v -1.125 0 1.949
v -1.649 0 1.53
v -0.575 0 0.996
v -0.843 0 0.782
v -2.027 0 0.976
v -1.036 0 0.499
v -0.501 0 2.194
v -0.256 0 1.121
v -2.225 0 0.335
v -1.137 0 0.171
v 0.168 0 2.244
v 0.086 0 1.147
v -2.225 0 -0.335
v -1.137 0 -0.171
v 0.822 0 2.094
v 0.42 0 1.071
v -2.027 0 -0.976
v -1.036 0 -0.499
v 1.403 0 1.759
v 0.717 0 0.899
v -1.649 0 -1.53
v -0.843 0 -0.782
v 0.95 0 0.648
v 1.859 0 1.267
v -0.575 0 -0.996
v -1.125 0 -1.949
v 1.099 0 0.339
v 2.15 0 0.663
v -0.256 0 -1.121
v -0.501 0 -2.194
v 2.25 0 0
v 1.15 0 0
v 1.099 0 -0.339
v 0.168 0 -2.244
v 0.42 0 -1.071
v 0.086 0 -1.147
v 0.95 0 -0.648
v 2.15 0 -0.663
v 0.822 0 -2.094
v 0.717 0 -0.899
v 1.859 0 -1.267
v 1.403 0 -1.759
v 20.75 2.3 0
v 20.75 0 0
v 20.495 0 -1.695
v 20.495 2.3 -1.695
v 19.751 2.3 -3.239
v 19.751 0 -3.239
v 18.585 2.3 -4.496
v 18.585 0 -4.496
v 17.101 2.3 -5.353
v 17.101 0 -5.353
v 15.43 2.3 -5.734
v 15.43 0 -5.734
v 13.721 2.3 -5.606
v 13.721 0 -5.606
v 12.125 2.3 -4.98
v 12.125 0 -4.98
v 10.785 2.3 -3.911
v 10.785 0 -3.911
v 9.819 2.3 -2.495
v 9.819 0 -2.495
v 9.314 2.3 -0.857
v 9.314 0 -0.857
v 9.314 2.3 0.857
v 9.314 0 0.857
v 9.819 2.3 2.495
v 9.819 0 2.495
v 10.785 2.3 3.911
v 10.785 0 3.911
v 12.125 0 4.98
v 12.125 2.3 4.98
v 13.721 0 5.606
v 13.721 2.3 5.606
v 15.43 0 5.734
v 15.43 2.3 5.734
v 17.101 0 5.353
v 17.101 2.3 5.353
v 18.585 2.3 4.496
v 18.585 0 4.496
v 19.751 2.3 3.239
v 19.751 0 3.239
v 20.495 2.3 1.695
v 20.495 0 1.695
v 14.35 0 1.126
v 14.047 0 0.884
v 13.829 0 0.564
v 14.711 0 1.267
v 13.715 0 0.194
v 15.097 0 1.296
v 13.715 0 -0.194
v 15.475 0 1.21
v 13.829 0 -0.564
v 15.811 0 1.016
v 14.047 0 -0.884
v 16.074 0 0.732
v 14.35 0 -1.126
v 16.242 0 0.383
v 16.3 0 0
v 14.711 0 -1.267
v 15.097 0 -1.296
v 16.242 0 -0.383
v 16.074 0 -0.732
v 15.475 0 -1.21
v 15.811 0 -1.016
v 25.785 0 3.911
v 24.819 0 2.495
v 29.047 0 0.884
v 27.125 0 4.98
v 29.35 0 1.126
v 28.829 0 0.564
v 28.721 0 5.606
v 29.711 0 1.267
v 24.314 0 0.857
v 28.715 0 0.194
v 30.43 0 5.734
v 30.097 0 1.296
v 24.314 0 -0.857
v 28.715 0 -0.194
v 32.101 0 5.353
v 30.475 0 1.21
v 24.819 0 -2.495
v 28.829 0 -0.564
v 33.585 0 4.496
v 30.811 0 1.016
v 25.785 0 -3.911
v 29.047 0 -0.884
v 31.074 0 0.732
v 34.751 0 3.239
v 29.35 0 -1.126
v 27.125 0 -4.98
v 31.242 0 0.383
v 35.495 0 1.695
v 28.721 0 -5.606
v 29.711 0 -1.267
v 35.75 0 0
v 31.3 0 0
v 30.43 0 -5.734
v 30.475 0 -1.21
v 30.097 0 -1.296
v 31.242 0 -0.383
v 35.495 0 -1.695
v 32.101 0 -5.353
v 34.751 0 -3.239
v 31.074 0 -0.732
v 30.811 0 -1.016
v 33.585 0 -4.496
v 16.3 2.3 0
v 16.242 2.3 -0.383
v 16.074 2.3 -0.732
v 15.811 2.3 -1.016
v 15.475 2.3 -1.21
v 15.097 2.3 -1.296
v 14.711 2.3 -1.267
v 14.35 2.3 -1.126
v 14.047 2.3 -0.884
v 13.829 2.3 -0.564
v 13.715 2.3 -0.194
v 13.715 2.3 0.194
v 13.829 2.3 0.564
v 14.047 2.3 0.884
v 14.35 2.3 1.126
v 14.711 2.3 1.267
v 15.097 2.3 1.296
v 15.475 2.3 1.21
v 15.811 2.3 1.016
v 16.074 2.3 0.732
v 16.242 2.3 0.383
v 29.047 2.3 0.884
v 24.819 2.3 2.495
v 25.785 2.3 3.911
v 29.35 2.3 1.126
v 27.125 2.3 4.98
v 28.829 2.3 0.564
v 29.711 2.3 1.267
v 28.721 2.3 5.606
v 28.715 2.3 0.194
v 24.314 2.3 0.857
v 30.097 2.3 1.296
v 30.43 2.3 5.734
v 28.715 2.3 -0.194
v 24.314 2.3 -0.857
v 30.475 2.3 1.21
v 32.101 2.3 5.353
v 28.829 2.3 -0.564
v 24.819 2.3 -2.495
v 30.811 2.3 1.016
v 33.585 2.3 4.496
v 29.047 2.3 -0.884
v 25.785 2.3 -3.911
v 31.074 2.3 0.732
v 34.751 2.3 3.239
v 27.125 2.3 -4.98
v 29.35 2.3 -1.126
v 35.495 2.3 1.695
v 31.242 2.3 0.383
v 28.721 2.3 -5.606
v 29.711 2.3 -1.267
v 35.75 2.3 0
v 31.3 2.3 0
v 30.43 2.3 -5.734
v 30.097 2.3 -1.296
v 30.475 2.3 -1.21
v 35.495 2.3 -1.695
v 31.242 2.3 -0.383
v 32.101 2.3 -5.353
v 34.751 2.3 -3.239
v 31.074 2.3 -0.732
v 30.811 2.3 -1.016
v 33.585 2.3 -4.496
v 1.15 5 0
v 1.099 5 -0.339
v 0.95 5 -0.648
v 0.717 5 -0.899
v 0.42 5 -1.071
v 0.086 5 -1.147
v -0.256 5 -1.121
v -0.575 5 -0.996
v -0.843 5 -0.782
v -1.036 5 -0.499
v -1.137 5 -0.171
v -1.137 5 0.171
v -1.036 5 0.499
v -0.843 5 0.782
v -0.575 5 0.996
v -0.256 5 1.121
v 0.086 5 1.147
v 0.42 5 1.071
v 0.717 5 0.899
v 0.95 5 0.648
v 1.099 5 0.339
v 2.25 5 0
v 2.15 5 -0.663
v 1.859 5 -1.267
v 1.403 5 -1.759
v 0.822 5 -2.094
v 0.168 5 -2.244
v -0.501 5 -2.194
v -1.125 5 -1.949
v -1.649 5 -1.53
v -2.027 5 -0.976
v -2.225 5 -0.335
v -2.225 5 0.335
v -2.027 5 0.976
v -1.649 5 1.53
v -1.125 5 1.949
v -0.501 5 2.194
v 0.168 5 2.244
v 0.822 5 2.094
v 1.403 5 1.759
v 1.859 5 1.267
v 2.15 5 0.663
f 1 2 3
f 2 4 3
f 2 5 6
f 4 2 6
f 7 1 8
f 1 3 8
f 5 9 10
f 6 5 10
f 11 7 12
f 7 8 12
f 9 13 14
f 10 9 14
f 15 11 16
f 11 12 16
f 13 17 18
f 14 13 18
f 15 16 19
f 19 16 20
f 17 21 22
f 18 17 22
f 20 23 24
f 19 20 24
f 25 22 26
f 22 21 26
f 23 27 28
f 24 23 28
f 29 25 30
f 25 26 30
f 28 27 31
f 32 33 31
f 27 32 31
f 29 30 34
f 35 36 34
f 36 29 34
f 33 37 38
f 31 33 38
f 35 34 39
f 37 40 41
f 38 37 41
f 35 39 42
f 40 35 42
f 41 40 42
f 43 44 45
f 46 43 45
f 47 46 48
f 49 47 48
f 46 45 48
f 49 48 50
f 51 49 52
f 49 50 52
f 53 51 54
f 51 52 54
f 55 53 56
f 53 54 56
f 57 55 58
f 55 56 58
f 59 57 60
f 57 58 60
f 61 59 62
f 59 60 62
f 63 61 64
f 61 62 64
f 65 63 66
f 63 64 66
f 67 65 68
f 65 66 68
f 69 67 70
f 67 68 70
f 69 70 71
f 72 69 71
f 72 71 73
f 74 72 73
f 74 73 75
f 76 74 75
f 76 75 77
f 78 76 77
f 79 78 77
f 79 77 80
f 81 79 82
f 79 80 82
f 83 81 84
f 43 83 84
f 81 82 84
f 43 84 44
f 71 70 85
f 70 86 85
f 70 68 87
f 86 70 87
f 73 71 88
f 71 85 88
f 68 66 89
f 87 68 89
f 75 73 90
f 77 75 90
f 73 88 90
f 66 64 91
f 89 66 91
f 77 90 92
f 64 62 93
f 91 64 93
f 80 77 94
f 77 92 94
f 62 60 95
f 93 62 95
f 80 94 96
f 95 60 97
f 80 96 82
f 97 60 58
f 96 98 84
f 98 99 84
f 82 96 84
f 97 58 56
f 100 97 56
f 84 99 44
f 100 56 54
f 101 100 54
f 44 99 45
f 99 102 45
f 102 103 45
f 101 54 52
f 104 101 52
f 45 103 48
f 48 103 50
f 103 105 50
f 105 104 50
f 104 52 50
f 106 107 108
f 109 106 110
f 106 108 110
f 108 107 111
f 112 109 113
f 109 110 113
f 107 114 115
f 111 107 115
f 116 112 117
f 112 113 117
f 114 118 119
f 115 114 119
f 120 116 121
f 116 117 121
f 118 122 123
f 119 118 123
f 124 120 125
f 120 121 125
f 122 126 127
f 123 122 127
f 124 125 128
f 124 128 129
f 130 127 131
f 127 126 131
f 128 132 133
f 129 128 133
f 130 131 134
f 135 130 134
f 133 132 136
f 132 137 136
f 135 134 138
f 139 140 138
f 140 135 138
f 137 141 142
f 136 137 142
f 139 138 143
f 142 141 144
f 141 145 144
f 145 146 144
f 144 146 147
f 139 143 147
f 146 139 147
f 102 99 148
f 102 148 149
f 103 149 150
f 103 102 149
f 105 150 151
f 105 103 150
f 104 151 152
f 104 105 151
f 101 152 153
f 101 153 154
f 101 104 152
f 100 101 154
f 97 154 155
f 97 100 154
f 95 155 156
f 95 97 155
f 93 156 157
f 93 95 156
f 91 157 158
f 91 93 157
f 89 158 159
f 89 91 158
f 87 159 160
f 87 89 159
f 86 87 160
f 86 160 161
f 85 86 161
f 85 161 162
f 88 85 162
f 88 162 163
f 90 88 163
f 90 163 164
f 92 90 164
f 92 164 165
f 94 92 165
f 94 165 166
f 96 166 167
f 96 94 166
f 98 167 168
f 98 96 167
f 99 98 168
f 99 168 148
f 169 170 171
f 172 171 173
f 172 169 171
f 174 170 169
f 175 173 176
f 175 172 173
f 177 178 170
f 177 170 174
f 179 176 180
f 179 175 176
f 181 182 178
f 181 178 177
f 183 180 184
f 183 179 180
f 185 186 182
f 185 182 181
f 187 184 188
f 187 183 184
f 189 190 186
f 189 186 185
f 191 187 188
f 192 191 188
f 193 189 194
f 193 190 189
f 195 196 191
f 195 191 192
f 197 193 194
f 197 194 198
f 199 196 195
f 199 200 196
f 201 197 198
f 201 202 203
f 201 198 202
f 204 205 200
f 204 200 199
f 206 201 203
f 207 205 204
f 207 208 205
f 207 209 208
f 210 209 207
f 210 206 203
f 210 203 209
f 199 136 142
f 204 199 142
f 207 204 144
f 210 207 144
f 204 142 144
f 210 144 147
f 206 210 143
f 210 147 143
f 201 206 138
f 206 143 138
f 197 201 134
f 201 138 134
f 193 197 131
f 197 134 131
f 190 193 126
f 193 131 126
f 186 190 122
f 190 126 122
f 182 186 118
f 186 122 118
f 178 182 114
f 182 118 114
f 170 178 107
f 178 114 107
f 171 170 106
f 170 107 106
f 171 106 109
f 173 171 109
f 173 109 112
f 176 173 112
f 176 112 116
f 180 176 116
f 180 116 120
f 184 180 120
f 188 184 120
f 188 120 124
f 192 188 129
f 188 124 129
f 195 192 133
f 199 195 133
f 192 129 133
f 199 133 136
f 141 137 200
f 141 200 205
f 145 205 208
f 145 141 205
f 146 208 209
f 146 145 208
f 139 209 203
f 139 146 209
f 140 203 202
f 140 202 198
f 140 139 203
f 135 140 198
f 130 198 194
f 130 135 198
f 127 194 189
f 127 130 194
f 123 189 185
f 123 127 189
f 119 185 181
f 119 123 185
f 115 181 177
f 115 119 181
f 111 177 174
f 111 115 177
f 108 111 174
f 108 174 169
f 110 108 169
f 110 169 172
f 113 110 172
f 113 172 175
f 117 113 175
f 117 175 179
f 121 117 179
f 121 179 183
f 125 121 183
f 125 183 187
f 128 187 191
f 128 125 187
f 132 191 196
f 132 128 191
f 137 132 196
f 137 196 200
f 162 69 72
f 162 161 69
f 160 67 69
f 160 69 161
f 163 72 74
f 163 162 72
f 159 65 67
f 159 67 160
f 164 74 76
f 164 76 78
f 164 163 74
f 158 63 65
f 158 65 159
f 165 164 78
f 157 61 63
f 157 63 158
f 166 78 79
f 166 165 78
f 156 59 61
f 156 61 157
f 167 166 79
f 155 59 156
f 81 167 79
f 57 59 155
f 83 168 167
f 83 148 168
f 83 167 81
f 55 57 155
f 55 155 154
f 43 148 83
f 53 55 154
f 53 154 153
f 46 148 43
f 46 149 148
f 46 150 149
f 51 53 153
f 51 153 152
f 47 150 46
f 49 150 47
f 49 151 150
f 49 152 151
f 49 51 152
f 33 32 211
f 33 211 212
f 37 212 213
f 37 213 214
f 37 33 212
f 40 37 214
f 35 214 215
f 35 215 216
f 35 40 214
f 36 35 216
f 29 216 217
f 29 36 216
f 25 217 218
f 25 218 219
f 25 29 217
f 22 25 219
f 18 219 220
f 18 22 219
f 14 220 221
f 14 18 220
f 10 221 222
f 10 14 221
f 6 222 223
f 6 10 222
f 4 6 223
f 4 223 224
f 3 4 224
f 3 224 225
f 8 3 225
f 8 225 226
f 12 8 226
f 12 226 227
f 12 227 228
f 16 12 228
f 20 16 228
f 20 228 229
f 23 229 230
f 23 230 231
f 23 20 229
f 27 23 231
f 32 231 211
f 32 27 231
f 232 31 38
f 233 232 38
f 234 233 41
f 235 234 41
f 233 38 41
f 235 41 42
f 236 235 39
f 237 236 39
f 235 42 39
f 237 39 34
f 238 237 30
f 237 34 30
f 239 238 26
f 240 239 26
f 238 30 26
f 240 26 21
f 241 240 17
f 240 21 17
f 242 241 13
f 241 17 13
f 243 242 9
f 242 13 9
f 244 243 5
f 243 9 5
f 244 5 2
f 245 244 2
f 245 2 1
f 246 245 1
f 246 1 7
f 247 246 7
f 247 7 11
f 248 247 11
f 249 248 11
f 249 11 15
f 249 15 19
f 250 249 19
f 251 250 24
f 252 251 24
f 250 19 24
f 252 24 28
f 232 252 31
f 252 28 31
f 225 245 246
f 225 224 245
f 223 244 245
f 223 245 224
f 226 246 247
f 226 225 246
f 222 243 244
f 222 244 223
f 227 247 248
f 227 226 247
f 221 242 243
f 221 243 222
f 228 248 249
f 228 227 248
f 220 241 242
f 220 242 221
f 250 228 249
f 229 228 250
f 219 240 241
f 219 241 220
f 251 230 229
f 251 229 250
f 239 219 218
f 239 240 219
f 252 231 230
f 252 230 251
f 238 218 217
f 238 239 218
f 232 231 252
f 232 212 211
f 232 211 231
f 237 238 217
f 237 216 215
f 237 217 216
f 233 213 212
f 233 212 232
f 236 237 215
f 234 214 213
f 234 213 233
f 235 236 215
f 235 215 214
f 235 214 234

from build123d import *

# Parameters (mm, degrees)
SKETCH1_R             = 2.25
SKETCH1_R_2           = 1.15
BOSS_EXTRUDE1_DEPTH   = 5
SKETCH2_R             = 5.75
SKETCH2_R_2           = 1.3
BOSS_EXTRUDE2_DEPTH   = 2.3
BOSS_EXTRUDE2_2_DEPTH = 2.3


with BuildPart() as part:
    # Sketch1 → Boss-Extrude1 (new body)
    with BuildSketch(Plane(origin=(0, 0, 0), x_dir=(1, 0, 0), z_dir=(0, 1, 0))):
        Circle(SKETCH1_R)
        Circle(SKETCH1_R_2, mode=Mode.SUBTRACT)
    extrude(amount=BOSS_EXTRUDE1_DEPTH)


with BuildPart() as body_2:
    # Sketch2 → Boss-Extrude2 (new body)
    with BuildSketch(Plane(origin=(0, 0, 0), x_dir=(1, 0, 0), z_dir=(0, 1, 0))):
        with Locations((15, 0)):
            Circle(SKETCH2_R)
        with Locations((15, 0)):
            Circle(SKETCH2_R_2, mode=Mode.SUBTRACT)
    extrude(amount=BOSS_EXTRUDE2_DEPTH)


with BuildPart() as body_3:
    # Sketch2 → Boss-Extrude2 2 (new body)
    with BuildSketch(Plane(origin=(0, 0, 0), x_dir=(1, 0, 0), z_dir=(0, 1, 0))):
        with Locations((30, 0)):
            Circle(SKETCH2_R)
        with Locations((30, 0)):
            Circle(SKETCH2_R_2, mode=Mode.SUBTRACT)
    extrude(amount=BOSS_EXTRUDE2_2_DEPTH)


solid = Compound([part.part, body_2.part, body_3.part])
